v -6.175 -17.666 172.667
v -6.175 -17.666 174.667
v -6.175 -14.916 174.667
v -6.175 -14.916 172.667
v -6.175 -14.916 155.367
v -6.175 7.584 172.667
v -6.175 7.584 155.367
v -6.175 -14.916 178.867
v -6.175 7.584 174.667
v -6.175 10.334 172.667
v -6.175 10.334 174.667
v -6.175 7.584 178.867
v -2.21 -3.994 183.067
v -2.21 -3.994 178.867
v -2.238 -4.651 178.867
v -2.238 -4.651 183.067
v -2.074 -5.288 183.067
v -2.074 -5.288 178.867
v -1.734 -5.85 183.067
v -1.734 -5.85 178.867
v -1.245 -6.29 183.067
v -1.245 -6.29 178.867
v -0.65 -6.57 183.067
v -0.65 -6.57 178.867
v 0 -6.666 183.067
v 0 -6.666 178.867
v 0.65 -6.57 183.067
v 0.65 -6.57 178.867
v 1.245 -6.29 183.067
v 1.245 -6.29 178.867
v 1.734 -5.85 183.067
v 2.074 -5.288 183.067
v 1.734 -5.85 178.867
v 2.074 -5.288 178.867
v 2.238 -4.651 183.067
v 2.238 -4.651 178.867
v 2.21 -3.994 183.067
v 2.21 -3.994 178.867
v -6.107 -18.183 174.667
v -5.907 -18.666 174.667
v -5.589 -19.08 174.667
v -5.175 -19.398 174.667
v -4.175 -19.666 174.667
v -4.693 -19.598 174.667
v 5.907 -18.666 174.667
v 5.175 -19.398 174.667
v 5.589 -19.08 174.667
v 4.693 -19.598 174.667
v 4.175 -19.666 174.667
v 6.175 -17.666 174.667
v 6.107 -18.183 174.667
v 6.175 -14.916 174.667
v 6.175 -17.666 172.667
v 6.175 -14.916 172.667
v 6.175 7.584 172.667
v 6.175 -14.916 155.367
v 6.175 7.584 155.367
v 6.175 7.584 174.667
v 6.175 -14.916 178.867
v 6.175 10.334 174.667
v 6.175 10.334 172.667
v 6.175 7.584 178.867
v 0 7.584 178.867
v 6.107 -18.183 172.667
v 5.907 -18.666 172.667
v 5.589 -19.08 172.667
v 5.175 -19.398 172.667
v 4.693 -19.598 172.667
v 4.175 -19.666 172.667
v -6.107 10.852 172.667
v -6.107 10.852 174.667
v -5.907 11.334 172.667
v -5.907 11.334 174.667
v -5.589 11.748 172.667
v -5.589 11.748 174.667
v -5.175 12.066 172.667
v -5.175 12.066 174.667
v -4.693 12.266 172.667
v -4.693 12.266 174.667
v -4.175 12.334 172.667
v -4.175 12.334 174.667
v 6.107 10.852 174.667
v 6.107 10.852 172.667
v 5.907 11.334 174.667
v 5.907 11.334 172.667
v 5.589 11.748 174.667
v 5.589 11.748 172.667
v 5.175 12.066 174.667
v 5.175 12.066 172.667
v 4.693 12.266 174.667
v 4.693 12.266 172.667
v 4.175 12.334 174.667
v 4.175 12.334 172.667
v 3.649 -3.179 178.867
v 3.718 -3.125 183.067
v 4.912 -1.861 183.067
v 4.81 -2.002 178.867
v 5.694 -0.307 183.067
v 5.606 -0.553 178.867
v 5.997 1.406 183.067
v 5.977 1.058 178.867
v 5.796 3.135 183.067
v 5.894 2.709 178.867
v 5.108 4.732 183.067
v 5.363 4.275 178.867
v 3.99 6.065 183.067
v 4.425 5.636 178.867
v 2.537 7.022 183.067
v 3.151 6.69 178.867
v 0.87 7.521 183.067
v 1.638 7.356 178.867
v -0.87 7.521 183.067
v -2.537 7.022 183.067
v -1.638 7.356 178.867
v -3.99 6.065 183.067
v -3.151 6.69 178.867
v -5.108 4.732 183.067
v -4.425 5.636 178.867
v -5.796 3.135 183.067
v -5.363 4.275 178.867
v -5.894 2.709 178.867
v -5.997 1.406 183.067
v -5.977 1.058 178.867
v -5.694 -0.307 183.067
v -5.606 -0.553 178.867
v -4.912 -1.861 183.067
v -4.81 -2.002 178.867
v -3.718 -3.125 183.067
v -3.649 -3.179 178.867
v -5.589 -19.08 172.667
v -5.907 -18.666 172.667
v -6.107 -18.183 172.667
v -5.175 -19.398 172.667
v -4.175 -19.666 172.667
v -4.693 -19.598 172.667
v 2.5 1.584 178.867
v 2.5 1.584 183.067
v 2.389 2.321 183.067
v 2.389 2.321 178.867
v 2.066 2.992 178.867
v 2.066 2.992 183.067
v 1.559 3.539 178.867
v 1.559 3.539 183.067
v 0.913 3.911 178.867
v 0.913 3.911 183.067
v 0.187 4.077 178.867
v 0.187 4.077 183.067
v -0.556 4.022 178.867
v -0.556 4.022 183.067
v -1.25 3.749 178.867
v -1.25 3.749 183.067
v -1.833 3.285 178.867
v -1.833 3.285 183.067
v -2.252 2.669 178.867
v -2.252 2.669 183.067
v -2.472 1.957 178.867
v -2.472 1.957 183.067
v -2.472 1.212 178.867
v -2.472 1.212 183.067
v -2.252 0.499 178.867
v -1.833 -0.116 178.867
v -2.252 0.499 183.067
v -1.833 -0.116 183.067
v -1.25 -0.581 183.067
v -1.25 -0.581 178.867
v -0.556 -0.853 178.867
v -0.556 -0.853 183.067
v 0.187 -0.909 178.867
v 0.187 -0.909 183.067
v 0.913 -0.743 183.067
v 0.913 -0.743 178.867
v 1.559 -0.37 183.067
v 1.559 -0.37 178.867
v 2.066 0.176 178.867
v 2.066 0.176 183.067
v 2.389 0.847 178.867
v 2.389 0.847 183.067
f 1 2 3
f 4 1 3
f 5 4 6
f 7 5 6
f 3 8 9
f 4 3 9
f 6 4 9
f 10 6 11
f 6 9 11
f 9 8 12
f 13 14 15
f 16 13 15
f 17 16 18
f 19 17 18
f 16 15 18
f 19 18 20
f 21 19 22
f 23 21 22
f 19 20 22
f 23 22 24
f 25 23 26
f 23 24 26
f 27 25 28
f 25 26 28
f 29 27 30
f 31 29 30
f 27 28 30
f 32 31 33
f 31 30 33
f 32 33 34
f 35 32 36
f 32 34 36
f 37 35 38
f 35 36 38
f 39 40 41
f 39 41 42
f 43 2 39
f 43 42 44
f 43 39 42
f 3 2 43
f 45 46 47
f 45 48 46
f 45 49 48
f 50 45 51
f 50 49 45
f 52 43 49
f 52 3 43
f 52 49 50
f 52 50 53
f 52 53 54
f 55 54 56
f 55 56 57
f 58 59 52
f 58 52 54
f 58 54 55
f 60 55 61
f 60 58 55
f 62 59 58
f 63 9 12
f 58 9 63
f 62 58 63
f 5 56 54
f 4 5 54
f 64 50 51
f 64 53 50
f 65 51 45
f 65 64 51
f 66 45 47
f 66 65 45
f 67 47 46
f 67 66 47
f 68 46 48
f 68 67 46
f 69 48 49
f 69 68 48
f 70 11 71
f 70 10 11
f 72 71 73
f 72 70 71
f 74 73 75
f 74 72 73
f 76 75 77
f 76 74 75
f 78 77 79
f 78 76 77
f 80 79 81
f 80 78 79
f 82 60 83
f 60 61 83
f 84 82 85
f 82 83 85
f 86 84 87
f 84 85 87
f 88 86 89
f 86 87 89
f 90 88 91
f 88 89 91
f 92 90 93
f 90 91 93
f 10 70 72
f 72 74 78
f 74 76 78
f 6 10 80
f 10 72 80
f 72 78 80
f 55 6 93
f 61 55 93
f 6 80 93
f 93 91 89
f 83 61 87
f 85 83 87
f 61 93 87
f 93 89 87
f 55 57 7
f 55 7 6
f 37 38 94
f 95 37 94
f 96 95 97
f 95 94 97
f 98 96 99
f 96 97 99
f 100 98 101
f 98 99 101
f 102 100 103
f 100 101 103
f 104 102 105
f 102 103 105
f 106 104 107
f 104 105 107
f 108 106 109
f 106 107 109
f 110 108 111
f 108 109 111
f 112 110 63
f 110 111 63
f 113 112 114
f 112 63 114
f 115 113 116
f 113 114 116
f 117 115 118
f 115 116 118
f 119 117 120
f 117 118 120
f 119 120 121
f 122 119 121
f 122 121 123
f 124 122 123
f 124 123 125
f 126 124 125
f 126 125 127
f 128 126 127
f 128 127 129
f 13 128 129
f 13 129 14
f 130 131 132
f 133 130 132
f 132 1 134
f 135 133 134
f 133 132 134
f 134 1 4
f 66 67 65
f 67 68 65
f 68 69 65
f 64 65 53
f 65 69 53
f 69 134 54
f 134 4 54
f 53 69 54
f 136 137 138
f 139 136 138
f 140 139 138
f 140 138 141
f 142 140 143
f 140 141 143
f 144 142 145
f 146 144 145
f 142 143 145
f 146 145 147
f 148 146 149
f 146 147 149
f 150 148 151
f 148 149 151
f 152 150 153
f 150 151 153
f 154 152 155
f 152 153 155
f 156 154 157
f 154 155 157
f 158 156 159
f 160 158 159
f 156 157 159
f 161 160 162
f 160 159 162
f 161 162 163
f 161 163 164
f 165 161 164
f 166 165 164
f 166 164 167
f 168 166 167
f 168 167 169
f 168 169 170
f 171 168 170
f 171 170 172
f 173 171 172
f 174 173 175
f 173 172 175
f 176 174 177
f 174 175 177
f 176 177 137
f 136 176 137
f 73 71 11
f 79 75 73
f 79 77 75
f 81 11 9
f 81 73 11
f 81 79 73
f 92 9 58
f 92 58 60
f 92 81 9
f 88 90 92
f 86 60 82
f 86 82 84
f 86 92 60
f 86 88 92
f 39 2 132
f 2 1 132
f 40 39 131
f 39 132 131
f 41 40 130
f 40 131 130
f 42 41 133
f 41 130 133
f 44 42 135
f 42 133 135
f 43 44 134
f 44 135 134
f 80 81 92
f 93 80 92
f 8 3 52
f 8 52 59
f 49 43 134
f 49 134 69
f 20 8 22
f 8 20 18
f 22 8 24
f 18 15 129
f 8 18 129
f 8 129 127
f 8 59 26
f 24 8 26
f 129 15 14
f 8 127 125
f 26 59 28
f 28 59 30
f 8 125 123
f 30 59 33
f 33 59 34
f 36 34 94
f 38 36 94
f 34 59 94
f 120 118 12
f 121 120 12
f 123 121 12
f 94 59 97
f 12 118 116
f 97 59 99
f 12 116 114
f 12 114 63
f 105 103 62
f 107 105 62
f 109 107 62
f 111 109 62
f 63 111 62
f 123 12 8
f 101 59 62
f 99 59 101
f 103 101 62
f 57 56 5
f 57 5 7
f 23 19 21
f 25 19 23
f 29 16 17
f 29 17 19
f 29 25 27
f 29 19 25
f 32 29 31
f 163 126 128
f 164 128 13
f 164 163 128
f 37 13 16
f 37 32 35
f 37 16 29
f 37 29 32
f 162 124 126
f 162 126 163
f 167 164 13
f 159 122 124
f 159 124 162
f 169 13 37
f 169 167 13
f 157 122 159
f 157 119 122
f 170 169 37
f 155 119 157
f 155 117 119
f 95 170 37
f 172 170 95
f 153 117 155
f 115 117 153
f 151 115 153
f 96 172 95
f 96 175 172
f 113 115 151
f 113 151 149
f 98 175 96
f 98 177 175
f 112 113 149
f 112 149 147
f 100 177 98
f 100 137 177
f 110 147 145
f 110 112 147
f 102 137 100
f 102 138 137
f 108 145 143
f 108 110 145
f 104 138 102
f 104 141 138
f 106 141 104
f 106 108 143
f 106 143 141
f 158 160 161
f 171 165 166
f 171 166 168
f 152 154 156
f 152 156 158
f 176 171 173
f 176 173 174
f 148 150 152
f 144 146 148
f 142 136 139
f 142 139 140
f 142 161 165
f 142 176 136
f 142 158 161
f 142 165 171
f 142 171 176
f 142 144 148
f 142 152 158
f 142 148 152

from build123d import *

# Parameters (mm, degrees)
SKETCH3_W           = 22.5
SKETCH3_H           = 23.5
BOSS_EXTRUDE1_DEPTH = 6.175
SKETCH4_W           = 12.35
SKETCH4_H           = 32
BOSS_EXTRUDE2_DEPTH = 2
BOSS_EXTRUDE3_DEPTH = 4.2
SKETCH6_R           = 2.5
CUT_EXTRUDE1_DEPTH  = 4.2
FILLET1_R           = 2


with BuildPart() as part:
    # Sketch3 → Boss-Extrude1 (new body, symmetric)
    with BuildSketch(Plane(origin=(0, -28.275548605, 0), x_dir=(0, 1, 0), z_dir=(1, 0, 0))):
        with Locations((24.609729517, 167.116706922)):
            Rectangle(SKETCH3_W, SKETCH3_H)
    extrude(amount=BOSS_EXTRUDE1_DEPTH, both=True)

    # Sketch4 → Boss-Extrude2 (add)
    with BuildSketch(Plane.XY.offset(174.666706922)):
        with Locations((0, -3.665819089)):
            Rectangle(SKETCH4_W, SKETCH4_H)
    extrude(amount=-BOSS_EXTRUDE2_DEPTH)

    # Sketch5 → Boss-Extrude3 (add)
    with BuildSketch(Plane.XY.offset(178.866706922)):
        with BuildLine():
            ThreePointArc((2.210095356, -3.993944089), (0, 7.584180911), (-2.210095356, -3.993944089))
            ThreePointArc((-2.210095356, -3.993944089), (0, -6.665819089), (2.210095356, -3.993944089))
        make_face()
    extrude(amount=BOSS_EXTRUDE3_DEPTH)

    # Sketch6 → Cut-Extrude1 (cut)
    with BuildSketch(Plane.XY.offset(183.066706922)):
        with Locations((0, 1.584180911)):
            Circle(SKETCH6_R)
    extrude(amount=-CUT_EXTRUDE1_DEPTH, mode=Mode.SUBTRACT)

    # Fillet1
    fillet1_edges = [part.edges().sort_by_distance(p)[0] for p in [
        (-6.175, -19.665819089, 173.666706922),
        (6.175, 12.334180911, 173.666706922),
        (-6.175, 12.334180911, 173.666706922),
        (6.175, -19.665819089, 173.666706922),
    ]]
    fillet(fillet1_edges, radius=FILLET1_R)


solid = part.part
